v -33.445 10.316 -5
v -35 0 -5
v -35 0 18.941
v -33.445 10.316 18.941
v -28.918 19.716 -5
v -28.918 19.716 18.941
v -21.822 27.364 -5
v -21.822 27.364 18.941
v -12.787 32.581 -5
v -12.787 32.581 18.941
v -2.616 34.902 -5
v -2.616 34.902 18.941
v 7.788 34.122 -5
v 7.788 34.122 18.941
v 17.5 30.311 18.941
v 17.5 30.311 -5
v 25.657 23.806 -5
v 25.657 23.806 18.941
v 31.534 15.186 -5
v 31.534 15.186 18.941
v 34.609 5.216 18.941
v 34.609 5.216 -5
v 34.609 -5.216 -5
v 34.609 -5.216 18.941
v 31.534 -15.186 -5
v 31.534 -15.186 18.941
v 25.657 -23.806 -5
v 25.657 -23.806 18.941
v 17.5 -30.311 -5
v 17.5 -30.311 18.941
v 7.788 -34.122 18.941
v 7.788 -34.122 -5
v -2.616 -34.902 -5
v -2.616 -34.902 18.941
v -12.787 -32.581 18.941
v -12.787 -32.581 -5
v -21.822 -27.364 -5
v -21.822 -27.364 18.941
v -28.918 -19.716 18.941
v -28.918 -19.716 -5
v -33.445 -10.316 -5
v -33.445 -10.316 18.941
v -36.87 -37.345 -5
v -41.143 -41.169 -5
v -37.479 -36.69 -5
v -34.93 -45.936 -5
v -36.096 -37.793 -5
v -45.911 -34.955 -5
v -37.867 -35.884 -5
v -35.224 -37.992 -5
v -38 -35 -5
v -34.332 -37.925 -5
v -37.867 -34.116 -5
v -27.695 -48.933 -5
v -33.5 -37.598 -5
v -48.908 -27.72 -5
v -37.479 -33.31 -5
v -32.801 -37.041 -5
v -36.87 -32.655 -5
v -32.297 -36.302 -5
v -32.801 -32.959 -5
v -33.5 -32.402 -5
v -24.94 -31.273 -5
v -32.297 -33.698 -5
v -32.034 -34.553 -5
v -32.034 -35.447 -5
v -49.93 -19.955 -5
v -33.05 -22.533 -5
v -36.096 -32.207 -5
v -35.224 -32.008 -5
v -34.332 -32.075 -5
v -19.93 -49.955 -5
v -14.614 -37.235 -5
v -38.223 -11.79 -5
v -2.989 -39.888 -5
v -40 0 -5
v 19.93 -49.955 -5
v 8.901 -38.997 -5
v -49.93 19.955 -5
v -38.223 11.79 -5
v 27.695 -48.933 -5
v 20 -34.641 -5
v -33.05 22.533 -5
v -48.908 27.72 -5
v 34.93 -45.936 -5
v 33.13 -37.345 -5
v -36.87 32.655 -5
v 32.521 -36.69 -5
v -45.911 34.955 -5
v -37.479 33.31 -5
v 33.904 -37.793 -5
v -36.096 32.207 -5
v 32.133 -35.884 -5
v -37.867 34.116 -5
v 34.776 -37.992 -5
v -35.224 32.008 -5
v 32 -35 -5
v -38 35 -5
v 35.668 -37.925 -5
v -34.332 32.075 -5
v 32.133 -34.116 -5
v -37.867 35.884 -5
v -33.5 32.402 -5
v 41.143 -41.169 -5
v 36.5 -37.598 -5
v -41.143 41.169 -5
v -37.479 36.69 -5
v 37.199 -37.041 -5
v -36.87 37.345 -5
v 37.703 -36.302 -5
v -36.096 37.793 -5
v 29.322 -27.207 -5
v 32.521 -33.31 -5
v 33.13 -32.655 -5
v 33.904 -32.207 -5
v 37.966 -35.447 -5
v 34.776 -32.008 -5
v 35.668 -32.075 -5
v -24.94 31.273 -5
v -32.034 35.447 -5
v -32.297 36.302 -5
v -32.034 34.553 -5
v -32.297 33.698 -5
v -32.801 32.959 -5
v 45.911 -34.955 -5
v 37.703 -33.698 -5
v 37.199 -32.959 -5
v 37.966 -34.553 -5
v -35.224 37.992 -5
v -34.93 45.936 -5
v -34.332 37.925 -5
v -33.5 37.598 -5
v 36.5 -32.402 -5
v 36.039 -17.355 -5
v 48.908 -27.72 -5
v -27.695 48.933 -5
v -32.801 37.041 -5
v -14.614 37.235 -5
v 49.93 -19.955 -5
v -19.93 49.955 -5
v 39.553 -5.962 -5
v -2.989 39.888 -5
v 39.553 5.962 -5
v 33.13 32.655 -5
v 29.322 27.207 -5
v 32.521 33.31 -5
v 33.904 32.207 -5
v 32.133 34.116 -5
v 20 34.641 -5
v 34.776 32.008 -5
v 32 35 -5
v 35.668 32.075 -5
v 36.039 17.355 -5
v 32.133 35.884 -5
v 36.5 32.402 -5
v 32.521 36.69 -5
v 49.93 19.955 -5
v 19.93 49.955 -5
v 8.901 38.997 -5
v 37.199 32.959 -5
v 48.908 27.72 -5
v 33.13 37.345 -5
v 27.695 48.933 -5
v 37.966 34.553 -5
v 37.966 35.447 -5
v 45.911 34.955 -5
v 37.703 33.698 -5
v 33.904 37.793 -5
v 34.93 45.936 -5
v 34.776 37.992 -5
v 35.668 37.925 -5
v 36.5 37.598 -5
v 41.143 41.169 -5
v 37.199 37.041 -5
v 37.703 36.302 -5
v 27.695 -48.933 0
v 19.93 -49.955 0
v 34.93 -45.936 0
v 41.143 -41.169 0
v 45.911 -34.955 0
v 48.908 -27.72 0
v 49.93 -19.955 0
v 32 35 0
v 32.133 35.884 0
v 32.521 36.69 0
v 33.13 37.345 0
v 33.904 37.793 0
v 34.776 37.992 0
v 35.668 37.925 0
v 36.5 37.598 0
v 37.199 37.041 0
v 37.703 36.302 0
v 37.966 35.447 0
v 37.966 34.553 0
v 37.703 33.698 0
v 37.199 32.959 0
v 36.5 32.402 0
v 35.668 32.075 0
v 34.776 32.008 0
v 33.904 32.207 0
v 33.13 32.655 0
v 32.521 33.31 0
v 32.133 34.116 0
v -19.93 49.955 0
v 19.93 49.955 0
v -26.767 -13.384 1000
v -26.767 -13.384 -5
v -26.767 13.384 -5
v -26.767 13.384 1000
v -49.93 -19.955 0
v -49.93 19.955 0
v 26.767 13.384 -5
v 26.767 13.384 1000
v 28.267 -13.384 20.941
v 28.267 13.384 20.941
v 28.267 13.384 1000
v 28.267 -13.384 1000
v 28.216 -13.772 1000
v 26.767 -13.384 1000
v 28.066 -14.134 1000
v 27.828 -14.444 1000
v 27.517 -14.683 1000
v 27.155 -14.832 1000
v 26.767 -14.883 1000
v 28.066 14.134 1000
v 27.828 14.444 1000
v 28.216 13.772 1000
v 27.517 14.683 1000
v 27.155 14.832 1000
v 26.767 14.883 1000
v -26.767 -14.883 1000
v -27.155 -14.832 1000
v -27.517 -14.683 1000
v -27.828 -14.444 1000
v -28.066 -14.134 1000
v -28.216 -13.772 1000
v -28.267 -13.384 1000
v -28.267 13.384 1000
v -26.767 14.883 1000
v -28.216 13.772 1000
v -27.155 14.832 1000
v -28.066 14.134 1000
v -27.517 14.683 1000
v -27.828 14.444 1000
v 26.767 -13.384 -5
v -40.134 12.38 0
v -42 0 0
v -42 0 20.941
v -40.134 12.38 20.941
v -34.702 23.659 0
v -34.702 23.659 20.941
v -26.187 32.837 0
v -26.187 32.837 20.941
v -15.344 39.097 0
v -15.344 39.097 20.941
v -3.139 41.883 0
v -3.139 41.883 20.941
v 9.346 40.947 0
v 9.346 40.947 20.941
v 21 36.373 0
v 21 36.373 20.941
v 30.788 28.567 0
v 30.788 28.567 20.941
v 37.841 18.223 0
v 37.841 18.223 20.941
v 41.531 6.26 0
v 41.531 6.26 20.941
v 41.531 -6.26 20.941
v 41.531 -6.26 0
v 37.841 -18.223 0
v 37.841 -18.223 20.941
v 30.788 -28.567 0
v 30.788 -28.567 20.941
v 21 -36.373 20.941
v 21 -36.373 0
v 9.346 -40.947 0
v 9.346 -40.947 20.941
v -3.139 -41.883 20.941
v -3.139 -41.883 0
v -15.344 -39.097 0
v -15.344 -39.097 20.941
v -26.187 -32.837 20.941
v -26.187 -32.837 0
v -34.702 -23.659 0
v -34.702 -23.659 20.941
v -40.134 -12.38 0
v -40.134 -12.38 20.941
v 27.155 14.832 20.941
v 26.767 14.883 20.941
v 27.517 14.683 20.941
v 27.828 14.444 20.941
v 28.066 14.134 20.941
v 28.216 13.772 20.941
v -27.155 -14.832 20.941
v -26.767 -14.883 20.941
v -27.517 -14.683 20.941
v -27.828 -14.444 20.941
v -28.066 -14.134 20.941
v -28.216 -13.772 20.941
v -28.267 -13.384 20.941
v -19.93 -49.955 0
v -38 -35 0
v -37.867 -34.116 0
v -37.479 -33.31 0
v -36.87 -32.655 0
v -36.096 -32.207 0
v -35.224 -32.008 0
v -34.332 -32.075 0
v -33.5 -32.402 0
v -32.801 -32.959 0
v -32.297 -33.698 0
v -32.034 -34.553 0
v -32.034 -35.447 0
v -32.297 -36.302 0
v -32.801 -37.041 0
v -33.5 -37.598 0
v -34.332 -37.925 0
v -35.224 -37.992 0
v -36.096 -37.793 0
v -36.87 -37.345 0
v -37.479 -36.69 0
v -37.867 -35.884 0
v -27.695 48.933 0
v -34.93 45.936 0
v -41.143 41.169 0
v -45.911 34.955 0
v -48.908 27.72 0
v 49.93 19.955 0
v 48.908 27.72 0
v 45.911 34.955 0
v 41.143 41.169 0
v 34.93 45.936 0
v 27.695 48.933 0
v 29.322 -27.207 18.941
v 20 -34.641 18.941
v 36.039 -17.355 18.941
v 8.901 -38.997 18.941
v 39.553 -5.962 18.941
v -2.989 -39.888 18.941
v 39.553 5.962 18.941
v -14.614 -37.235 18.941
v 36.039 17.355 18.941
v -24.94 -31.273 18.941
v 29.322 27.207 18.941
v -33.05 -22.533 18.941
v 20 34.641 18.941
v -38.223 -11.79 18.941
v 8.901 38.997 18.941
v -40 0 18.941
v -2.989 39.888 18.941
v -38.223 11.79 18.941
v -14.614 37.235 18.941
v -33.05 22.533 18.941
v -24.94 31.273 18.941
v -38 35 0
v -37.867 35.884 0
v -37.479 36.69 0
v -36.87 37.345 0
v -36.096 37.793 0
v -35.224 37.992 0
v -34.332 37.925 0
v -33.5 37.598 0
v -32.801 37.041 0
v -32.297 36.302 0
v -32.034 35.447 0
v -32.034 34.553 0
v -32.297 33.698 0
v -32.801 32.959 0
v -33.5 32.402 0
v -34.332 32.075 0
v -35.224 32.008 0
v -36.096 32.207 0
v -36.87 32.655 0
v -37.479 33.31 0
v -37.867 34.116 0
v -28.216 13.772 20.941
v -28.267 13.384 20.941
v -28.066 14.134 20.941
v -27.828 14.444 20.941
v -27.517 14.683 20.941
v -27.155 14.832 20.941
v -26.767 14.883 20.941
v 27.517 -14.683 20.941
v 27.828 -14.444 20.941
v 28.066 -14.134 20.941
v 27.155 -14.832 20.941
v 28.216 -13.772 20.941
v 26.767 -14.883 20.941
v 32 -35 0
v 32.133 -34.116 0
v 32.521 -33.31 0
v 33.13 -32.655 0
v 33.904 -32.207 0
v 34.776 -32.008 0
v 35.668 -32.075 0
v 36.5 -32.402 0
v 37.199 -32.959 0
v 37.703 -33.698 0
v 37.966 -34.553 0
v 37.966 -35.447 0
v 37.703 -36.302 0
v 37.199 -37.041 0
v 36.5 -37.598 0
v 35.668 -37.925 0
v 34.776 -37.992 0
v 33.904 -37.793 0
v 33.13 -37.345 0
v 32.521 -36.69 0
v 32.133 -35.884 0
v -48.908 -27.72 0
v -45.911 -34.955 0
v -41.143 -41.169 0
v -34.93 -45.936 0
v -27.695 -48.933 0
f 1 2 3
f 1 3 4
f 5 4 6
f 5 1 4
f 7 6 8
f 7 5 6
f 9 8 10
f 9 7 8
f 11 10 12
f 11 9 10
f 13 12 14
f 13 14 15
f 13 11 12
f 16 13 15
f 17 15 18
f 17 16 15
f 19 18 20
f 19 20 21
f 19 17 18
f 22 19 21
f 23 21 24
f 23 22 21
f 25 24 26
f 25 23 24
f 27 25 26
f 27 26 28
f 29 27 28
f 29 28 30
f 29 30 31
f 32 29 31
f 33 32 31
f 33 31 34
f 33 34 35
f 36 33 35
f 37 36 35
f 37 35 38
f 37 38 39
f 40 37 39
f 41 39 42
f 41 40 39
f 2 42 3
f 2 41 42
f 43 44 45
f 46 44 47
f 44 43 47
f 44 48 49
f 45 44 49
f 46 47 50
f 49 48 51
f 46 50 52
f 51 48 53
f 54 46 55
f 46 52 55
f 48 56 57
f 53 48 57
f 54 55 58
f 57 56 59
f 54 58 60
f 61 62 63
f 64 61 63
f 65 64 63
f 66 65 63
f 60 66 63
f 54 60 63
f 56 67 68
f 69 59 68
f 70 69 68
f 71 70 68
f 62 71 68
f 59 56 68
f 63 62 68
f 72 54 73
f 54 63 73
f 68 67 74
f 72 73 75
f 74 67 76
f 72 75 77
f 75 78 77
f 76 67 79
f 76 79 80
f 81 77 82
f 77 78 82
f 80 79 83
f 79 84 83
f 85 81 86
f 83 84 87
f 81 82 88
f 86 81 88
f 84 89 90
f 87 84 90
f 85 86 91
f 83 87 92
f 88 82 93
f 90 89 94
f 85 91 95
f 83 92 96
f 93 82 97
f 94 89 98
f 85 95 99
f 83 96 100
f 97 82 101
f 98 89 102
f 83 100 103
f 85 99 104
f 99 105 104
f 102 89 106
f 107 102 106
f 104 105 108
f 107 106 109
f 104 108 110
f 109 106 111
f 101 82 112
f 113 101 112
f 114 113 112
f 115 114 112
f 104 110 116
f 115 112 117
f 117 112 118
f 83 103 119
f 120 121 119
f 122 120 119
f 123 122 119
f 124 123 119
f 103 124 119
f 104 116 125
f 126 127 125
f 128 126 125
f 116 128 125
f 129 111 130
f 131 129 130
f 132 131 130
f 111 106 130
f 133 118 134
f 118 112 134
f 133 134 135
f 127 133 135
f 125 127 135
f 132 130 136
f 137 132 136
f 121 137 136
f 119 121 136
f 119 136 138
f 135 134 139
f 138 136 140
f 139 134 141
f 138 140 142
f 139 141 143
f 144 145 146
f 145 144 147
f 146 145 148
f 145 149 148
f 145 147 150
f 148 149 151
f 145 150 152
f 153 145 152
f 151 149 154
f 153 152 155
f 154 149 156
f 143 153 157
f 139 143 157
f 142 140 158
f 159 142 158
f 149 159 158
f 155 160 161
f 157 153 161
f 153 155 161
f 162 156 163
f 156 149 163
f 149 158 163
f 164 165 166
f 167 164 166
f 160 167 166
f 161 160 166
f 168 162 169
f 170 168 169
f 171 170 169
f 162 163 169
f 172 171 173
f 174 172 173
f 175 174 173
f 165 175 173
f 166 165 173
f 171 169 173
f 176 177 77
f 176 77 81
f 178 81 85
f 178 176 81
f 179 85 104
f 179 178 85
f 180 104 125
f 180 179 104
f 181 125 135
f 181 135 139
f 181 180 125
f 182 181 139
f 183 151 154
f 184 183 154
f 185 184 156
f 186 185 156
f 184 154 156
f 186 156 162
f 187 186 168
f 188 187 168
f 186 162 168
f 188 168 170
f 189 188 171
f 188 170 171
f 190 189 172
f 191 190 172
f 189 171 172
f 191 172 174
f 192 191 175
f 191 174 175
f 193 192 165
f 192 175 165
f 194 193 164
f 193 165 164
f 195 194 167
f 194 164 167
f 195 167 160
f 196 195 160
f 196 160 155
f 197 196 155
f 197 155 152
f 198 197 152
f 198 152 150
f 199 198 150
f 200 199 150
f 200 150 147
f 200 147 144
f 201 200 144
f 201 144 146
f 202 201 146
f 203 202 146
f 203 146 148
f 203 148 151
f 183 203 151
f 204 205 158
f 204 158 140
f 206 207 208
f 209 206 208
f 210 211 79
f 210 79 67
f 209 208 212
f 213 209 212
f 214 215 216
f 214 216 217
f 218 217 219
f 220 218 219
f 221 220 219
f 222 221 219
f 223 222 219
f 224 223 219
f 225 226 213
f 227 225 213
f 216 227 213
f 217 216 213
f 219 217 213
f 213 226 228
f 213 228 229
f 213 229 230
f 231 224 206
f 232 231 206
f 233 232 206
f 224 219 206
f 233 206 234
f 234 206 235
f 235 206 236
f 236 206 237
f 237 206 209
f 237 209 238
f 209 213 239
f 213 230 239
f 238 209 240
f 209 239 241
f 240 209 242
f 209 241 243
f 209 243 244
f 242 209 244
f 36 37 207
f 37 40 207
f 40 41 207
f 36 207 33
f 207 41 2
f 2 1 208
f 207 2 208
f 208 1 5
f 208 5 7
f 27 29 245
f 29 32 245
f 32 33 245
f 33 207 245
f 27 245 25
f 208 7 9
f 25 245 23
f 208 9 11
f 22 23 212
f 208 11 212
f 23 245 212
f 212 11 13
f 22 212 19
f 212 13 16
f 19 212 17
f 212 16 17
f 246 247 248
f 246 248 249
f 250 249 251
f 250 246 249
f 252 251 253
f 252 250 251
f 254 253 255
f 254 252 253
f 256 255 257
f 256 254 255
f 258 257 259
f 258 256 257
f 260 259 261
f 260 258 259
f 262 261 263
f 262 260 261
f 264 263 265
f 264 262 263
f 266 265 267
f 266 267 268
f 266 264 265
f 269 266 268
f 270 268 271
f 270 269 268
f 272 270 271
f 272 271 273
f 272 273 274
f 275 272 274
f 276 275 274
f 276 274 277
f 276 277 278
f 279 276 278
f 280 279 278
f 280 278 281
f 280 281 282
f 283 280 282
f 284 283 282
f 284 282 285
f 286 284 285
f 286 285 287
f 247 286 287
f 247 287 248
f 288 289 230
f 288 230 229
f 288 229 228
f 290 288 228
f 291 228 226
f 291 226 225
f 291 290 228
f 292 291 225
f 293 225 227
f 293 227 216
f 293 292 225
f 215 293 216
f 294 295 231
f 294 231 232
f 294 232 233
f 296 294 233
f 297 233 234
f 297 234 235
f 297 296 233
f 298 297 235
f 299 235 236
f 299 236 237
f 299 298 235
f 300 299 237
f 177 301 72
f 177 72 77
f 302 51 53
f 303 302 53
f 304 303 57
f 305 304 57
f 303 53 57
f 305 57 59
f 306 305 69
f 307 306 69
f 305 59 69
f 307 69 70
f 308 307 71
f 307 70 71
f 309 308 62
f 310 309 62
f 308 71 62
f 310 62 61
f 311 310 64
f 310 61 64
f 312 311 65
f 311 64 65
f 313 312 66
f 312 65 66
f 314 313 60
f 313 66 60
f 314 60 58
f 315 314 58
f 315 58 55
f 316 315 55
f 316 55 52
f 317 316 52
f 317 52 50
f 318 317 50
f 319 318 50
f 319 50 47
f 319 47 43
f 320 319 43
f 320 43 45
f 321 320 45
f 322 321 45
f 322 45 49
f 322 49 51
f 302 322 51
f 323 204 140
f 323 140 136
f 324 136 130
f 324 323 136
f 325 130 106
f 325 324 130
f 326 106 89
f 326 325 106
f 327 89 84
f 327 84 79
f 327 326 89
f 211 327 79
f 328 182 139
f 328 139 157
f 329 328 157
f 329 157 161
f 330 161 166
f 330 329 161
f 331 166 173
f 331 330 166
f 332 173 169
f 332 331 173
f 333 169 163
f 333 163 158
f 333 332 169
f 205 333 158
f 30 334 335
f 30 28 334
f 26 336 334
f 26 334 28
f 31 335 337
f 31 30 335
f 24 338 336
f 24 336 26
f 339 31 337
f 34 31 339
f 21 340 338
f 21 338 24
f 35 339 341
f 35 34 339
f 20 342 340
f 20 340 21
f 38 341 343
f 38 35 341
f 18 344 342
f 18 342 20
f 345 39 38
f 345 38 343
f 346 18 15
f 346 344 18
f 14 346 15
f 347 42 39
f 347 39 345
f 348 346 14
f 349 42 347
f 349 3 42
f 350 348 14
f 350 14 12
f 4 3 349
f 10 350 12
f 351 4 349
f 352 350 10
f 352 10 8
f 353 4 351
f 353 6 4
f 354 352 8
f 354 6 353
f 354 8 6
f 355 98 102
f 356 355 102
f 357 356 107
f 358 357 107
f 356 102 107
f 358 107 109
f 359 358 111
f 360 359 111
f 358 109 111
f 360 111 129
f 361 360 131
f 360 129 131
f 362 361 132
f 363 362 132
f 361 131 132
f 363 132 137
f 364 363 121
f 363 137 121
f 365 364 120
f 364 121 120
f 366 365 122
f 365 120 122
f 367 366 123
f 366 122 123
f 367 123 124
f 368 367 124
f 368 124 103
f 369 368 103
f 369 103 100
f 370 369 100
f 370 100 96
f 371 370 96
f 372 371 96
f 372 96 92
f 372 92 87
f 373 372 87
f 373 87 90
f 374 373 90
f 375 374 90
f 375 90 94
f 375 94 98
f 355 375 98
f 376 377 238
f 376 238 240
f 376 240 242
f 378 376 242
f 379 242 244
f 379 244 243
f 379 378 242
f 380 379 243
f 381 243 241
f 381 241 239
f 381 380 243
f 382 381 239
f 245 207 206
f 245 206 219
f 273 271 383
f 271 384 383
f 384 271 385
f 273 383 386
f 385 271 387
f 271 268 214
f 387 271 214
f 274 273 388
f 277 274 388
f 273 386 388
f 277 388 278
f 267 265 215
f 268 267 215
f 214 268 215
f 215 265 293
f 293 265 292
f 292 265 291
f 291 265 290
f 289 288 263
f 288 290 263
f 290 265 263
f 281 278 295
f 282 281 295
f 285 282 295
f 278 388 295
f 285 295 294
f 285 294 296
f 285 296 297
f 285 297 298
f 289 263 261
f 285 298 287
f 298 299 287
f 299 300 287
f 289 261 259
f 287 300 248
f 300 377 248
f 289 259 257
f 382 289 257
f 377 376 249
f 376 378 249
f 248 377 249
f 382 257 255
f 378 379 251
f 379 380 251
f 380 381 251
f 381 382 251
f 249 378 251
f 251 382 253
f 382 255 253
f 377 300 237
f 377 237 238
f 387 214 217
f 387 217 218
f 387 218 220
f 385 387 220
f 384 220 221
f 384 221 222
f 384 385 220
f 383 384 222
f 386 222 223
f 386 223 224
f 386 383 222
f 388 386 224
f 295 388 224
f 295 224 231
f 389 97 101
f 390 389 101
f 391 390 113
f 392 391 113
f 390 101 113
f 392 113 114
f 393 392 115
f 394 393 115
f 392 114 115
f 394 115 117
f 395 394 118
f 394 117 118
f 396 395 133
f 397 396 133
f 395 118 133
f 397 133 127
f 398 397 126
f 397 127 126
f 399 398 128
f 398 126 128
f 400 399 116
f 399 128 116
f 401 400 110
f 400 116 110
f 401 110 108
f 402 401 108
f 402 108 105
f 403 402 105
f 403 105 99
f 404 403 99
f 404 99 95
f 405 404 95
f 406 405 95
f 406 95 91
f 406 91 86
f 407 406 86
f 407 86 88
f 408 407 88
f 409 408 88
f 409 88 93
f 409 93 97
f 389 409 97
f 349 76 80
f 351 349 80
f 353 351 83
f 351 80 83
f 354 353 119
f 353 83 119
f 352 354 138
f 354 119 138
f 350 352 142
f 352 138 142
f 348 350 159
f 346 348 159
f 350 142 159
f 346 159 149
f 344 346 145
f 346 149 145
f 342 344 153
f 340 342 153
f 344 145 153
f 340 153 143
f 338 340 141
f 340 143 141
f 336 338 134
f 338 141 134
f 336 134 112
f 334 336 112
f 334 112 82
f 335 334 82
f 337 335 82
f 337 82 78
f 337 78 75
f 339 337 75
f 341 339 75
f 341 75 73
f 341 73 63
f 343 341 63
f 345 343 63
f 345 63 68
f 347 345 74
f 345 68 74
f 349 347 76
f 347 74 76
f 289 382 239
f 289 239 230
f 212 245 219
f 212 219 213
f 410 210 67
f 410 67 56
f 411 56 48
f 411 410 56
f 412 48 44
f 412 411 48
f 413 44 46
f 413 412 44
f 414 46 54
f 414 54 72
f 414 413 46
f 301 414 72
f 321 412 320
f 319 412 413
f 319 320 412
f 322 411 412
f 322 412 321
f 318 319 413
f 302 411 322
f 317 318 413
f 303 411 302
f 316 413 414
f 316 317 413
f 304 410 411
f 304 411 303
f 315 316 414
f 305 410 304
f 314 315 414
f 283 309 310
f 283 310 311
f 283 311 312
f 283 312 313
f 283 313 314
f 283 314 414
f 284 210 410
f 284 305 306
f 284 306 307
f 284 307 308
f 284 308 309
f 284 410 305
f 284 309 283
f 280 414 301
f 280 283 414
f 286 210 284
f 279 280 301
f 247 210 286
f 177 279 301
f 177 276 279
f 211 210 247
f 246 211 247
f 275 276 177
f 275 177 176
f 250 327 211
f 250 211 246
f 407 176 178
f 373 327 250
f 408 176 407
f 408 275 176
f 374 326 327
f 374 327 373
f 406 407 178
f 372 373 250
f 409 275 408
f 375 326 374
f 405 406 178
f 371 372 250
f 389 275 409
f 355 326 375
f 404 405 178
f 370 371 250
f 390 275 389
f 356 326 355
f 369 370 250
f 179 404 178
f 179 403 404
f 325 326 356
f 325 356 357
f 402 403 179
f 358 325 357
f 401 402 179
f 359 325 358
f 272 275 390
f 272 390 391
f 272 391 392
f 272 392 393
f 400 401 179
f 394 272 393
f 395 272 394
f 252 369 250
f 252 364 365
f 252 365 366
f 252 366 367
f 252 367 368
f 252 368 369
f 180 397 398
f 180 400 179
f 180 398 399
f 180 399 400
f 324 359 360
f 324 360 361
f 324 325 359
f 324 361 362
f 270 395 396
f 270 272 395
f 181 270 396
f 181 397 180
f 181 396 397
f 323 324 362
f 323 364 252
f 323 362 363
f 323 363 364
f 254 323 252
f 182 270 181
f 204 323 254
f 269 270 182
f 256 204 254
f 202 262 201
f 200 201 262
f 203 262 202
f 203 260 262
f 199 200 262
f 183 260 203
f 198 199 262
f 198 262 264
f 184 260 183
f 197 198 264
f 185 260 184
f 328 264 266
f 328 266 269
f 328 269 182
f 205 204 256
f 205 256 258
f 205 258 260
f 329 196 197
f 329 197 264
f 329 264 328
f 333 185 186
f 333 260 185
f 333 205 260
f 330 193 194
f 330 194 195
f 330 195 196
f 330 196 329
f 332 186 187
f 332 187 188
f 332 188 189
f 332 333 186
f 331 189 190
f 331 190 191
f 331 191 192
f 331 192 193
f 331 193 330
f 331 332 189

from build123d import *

# Parameters (mm, degrees)
SKETCH_2_W               = 53.534
SKETCH_2_H               = 26.767
EXTRUDE_1_DEPTH          = 1000
EXTRUDE_2_DEPTH          = 5
SKETCH_8_W               = 53.534
SKETCH_8_H               = 26.767
CUT_EXTRUDE_2_DEPTH      = 1010
SKETCH_9_R               = 40
SKETCH_9_R_2             = 35
CUT_EXTRUDE_4_DEPTH      = 1010
SKETCH_10_R              = 3
CUT_EXTRUDE_7_DEPTH      = 1010
SKETCH_11_R              = 42
EXTRUDE_3_DEPTH          = 25.94125
SKETCH_9_2_R             = 40
SKETCH_9_2_R_2           = 35
CUT_EXTRUDE_8_DEPTH      = 23.94125
CUT_EXTRUDE_9_DEPTH      = 23.94125
CUT_EXTRUDE_9_DEPTH_BACK = 2000
SKETCH_8_2_W             = 53.534
SKETCH_8_2_H             = 26.767


with BuildPart() as part:
    # Эскиз2 → Бобышка-Вытянуть1 (new body)
    with BuildSketch(Plane.XY):
        with BuildLine():
            Line((-26.767, 14.8835), (26.767, 14.8835))
            ThreePointArc((26.767, 14.8835), (27.827660172, 14.444160172), (28.267, 13.3835))
            Line((28.267, 13.3835), (28.267, -13.3835))
            ThreePointArc((28.267, -13.3835), (27.827660172, -14.444160172), (26.767, -14.8835))
            Line((26.767, -14.8835), (-26.767, -14.8835))
            ThreePointArc((-26.767, -14.8835), (-27.827660172, -14.444160172), (-28.267, -13.3835))
            Line((-28.267, -13.3835), (-28.267, 13.3835))
            ThreePointArc((-28.267, 13.3835), (-27.827660172, 14.444160172), (-26.767, 14.8835))
        make_face()
        Rectangle(SKETCH_2_W, SKETCH_2_H, mode=Mode.SUBTRACT)
    extrude(amount=EXTRUDE_1_DEPTH)

    # Эскиз6 → Бобышка-Вытянуть2 (add)
    with BuildSketch(Plane(origin=(0, 0, 0), x_dir=(-1, 0, 0), z_dir=(0, 0, -1))):
        with BuildLine():
            Line((-19.929966526, 49.955317788), (19.929966526, 49.955317788))
            ThreePointArc((19.929966526, 49.955317788), (41.143169962, 41.168521224), (49.929966526, 19.955317788))
            Line((49.929966526, 19.955317788), (49.929966526, -19.955317788))
            ThreePointArc((49.929966526, -19.955317788), (41.143169962, -41.168521224), (19.929966526, -49.955317788))
            Line((19.929966526, -49.955317788), (-19.929966526, -49.955317788))
            ThreePointArc((-19.929966526, -49.955317788), (-41.143169962, -41.168521224), (-49.929966526, -19.955317788))
            Line((-49.929966526, -19.955317788), (-49.929966526, 19.955317788))
            ThreePointArc((-49.929966526, 19.955317788), (-41.143169962, 41.168521224), (-19.929966526, 49.955317788))
        make_face()
    extrude(amount=EXTRUDE_2_DEPTH)

    # Эскиз8 → Вырез-Вытянуть2 (cut)
    with BuildSketch(Plane.XY.offset(1000)):
        Rectangle(SKETCH_8_W, SKETCH_8_H)
    extrude(amount=-CUT_EXTRUDE_2_DEPTH, mode=Mode.SUBTRACT)

    # Эскиз9 → Вырез-Вытянуть4 (cut)
    with BuildSketch(Plane(origin=(0, 0, -5), x_dir=(-1, 0, 0), z_dir=(0, 0, -1))):
        Circle(SKETCH_9_R)
        Circle(SKETCH_9_R_2, mode=Mode.SUBTRACT)
    extrude(amount=-CUT_EXTRUDE_4_DEPTH, mode=Mode.SUBTRACT)


with BuildPart() as cut_extrude_4_piece_1:
    # of the separate pieces the step leaves, piece 1, a body of its own (cut_extrude_4_pieces)
    add(part.part.solids().sort_by_distance((-35, 0, 0))[0])



with BuildPart() as cut_extrude_4_piece_2:
    # of the separate pieces the step leaves, piece 2, a body of its own (cut_extrude_4_pieces)
    add(part.part.solids().sort_by_distance((19.929966526, 49.955317788, 0))[0])

    # Эскиз10 → Вырез-Вытянуть7 (cut)
    with BuildSketch(Plane(origin=(0, 0, -5), x_dir=(-1, 0, 0), z_dir=(0, 0, -1))):
        with Locations((-35, 35)):
            Circle(SKETCH_10_R)
        with Locations((-35, -35)):
            Circle(SKETCH_10_R)
        with Locations((35, -35)):
            Circle(SKETCH_10_R)
        with Locations((35, 35)):
            Circle(SKETCH_10_R)
    extrude(amount=-CUT_EXTRUDE_7_DEPTH, mode=Mode.SUBTRACT)


with BuildPart() as cut_extrude_4_piece_1_1:
    add(cut_extrude_4_piece_1.part)

    add(cut_extrude_4_piece_2.part)  # Бобышка-Вытянуть3 merges Вырез-Вытянуть4 piece 2
    # Эскиз11 → Бобышка-Вытянуть3 (add)
    with BuildSketch(Plane(origin=(0, 0, -5), x_dir=(-1, 0, 0), z_dir=(0, 0, -1))):
        Circle(SKETCH_11_R)
    extrude(amount=-EXTRUDE_3_DEPTH)

    # Эскиз9<2> → Вырез-Вытянуть8 (cut)
    with BuildSketch(Plane(origin=(0, 0, -5), x_dir=(-1, 0, 0), z_dir=(0, 0, -1))):
        Circle(SKETCH_9_2_R)
        Circle(SKETCH_9_2_R_2, mode=Mode.SUBTRACT)
    extrude(amount=-CUT_EXTRUDE_8_DEPTH, mode=Mode.SUBTRACT)

    # Эскиз8<2> → Вырез-Вытянуть9 (cut, two sides: drawn at the far end of the back side and taken through both)
    with BuildSketch(Plane.XY.offset(1000).offset(-CUT_EXTRUDE_9_DEPTH_BACK)):
        Rectangle(SKETCH_8_2_W, SKETCH_8_2_H)
    extrude(amount=CUT_EXTRUDE_9_DEPTH + CUT_EXTRUDE_9_DEPTH_BACK, mode=Mode.SUBTRACT)


solid = cut_extrude_4_piece_1_1.part
